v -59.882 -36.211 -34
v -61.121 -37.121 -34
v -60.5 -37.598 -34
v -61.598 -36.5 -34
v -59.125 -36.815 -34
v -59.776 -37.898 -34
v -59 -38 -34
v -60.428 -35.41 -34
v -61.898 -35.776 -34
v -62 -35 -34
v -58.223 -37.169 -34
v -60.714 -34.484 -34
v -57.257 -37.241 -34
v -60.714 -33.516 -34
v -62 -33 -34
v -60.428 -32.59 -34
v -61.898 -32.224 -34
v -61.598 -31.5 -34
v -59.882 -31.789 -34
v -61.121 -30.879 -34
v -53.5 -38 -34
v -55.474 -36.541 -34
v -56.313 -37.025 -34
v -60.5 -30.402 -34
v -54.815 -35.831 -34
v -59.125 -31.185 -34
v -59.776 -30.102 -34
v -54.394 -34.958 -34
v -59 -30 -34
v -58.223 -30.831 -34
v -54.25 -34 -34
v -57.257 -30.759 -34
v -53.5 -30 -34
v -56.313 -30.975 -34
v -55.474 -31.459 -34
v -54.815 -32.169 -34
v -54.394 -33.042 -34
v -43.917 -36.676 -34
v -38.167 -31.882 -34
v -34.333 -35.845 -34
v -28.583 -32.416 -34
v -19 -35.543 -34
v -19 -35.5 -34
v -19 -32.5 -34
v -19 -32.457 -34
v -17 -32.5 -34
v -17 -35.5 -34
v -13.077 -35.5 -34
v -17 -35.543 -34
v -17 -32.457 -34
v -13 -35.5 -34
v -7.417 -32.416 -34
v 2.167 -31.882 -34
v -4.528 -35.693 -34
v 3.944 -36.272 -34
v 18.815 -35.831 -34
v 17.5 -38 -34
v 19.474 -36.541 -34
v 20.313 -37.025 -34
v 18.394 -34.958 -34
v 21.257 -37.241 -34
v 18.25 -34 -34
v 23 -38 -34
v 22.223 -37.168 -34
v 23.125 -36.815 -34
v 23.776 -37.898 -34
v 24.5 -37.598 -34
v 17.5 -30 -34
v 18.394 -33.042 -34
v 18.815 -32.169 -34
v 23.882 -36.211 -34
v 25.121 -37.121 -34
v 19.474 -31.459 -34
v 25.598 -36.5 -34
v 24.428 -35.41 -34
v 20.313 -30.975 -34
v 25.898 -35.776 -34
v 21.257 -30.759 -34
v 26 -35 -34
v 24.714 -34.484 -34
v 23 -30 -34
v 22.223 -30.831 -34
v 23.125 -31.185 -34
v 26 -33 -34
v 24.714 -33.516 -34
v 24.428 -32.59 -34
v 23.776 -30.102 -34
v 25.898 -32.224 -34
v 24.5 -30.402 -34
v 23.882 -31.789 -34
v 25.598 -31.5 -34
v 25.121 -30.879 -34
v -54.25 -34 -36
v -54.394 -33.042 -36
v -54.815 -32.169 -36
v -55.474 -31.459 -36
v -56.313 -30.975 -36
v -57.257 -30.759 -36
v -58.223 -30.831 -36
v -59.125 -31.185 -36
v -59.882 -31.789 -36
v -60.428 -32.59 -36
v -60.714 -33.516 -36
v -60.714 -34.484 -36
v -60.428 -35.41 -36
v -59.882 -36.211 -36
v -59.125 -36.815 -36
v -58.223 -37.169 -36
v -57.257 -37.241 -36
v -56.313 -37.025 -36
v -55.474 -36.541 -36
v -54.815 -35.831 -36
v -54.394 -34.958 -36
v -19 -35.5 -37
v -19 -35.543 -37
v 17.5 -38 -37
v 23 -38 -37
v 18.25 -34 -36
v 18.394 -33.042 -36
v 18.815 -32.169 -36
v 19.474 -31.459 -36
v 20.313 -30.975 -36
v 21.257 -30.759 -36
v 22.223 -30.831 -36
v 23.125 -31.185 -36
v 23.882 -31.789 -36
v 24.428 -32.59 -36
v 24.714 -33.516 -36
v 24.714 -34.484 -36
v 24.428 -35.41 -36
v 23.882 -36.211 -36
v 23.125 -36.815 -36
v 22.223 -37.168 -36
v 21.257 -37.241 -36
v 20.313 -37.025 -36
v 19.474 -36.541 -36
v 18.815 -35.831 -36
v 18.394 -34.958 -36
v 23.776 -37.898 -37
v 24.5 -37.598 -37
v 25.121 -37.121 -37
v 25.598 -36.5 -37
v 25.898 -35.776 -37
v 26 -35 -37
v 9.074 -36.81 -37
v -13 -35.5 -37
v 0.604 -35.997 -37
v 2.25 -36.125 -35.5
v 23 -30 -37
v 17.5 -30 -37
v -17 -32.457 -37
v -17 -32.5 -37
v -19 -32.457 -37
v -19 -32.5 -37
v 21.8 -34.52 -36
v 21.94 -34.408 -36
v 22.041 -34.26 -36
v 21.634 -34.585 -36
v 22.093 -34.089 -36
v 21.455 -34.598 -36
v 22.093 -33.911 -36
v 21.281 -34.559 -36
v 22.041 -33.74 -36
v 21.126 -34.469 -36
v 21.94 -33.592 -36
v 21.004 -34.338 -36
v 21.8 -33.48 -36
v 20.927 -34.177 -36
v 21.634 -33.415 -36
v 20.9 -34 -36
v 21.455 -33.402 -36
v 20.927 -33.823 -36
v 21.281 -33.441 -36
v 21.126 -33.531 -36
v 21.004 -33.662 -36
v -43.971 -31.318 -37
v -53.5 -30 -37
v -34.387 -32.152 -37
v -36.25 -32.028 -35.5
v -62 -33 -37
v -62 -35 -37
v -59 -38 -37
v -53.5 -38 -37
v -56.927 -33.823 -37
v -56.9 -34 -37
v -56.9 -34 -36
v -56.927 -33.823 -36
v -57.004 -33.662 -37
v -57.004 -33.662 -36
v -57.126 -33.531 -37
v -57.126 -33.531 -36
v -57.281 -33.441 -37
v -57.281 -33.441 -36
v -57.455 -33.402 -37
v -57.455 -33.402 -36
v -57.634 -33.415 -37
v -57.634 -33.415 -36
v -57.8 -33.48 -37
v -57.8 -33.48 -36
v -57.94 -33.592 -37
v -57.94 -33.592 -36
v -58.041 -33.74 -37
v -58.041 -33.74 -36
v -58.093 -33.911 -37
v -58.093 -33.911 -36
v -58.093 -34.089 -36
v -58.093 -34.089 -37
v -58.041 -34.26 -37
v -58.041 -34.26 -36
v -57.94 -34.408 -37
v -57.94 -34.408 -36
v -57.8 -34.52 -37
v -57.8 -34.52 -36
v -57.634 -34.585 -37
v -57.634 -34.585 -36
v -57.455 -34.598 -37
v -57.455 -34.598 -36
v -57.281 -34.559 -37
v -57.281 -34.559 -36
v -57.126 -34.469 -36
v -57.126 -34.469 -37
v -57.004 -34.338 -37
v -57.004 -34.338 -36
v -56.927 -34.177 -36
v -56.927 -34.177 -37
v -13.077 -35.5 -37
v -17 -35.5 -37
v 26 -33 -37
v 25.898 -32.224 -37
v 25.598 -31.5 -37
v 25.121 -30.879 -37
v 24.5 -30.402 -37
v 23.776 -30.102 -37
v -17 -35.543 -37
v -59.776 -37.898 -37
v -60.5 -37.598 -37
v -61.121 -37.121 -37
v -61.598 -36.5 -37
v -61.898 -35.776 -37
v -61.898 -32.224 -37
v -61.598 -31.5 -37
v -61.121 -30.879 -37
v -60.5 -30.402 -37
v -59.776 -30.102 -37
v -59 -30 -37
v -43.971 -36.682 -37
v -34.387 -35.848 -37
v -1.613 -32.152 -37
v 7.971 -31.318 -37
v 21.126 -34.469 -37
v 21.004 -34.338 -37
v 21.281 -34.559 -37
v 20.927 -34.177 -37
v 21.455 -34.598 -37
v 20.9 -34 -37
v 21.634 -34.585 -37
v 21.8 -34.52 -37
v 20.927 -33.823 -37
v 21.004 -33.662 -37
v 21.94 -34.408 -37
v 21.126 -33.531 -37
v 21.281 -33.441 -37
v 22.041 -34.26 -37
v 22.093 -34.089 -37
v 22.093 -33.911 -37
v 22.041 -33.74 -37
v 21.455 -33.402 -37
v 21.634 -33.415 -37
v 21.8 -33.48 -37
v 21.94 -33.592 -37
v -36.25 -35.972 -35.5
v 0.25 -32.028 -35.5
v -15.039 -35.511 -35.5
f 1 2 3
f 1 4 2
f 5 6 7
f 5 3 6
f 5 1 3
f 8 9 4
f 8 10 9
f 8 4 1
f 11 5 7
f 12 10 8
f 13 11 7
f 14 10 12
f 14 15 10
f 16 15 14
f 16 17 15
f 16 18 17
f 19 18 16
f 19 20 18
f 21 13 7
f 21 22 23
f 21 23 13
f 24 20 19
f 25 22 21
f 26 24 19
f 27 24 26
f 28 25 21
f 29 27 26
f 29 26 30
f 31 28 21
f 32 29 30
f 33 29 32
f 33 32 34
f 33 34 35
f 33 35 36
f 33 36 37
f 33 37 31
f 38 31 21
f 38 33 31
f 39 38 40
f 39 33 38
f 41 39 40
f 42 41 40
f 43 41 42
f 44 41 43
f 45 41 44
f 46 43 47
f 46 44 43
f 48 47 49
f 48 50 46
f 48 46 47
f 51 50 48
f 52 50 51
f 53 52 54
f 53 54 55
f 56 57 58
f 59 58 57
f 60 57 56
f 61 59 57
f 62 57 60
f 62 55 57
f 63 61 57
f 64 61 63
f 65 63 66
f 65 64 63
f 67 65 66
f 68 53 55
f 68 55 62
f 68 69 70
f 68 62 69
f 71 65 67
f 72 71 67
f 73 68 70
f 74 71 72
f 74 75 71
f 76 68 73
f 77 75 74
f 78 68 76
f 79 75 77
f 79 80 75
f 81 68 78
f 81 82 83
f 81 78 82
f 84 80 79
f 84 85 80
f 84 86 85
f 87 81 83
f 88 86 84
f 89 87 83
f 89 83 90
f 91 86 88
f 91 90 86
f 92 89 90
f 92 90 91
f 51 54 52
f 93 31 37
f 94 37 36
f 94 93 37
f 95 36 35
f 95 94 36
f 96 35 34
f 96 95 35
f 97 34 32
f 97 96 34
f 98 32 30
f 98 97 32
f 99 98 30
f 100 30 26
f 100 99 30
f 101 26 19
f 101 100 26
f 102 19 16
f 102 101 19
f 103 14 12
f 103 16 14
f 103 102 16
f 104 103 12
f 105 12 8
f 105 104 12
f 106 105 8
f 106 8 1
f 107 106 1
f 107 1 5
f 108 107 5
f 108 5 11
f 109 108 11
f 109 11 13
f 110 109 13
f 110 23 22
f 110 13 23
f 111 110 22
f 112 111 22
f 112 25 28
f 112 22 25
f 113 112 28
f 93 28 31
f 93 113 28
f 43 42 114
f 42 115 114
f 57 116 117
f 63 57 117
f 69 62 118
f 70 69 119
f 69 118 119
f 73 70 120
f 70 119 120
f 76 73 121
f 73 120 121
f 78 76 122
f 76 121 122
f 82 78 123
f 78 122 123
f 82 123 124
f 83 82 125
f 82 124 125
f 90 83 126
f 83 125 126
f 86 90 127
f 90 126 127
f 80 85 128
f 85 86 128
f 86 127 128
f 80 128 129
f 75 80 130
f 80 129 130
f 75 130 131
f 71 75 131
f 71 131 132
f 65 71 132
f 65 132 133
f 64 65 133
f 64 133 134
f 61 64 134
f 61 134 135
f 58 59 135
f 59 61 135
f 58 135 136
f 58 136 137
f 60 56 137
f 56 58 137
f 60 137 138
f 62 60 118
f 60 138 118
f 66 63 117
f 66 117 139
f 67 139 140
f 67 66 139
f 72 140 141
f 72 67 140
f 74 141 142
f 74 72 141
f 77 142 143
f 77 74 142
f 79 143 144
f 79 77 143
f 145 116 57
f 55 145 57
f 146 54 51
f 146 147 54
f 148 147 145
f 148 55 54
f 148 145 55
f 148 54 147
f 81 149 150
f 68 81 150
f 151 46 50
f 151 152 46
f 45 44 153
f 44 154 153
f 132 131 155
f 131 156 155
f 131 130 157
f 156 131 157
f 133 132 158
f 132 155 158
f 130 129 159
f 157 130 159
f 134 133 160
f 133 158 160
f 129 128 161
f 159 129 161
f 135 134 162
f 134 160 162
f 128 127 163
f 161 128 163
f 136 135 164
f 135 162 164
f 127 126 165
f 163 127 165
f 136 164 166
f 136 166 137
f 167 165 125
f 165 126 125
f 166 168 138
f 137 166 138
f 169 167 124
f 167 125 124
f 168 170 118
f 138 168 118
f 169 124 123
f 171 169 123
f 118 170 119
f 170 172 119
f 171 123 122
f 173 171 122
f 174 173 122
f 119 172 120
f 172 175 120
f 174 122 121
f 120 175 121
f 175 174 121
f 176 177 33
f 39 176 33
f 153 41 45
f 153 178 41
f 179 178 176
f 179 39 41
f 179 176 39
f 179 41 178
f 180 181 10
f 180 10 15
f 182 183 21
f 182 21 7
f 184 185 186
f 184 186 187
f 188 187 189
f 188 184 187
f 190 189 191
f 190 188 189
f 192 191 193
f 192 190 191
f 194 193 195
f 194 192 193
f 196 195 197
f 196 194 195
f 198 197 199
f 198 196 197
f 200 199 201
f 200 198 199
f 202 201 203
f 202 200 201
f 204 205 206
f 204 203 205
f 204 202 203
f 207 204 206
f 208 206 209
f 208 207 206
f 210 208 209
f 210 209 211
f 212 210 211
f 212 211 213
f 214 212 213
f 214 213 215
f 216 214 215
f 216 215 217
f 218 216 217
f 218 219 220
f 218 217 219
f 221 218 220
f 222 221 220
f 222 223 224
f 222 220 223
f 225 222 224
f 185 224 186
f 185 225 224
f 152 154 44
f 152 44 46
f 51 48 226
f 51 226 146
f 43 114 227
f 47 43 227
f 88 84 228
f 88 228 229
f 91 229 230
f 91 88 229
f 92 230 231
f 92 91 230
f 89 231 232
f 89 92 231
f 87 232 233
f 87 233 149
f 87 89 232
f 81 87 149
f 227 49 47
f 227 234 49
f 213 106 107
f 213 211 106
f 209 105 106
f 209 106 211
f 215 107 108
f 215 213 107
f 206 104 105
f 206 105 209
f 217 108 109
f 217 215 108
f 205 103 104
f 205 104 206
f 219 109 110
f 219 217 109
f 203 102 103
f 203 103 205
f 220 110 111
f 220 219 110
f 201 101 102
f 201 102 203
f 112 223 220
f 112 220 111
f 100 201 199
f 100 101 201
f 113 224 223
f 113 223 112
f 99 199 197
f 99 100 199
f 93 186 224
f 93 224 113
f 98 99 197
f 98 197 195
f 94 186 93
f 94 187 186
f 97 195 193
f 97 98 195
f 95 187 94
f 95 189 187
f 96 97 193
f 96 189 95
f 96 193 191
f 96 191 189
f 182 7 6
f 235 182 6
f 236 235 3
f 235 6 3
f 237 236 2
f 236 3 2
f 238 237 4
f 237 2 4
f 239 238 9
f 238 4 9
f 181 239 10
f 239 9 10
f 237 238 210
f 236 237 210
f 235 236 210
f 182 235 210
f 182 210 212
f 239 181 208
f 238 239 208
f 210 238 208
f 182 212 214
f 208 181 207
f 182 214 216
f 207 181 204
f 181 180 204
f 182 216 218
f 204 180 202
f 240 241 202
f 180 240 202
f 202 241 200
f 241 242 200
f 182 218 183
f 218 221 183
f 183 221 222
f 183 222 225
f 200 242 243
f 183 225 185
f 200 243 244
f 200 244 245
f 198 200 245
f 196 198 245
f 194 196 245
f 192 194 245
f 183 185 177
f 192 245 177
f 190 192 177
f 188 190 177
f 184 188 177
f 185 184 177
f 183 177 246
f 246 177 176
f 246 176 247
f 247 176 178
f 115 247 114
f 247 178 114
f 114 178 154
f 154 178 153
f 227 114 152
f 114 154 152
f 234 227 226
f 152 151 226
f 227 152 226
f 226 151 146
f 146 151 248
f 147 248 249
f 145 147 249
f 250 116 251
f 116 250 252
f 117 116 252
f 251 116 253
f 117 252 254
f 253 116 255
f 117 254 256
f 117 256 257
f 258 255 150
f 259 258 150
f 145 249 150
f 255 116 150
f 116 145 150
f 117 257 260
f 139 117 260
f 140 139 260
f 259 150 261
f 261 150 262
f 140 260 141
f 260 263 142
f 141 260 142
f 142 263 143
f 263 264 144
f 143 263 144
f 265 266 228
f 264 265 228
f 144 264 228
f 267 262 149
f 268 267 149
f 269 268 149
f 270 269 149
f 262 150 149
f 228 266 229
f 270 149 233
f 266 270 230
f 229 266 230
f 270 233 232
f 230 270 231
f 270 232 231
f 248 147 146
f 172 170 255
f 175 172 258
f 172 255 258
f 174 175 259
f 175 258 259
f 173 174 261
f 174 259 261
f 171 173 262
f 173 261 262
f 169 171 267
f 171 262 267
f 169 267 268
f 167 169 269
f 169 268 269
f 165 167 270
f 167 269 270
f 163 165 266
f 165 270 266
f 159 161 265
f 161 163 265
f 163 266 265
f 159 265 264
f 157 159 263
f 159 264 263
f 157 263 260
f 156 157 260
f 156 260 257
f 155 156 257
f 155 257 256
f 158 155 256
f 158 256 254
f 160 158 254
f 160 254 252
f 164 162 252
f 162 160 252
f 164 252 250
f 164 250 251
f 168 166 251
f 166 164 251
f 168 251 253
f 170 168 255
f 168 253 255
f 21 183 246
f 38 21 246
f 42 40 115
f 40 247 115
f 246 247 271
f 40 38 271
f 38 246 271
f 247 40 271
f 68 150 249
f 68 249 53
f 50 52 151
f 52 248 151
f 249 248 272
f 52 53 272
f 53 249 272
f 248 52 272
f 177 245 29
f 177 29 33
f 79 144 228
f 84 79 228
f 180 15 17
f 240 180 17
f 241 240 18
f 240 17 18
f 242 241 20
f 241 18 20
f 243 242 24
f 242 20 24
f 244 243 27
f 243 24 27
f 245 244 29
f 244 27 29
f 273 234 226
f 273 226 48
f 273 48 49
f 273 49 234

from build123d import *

# Parameters (mm, degrees)
BOX081_W                          = 90
BOX081_H                          = 9
BOX081_DEPTH                      = 4
BOX080_W                          = 10
BOX080_H                          = 3
BOX080_DEPTH                      = 4
BOX079_W                          = 40
BOX079_H                          = 10
BOX079_DEPTH                      = 10
CYLINDER143_R                     = 3.25
CYLINDER143_DEPTH                 = 3.5
CYLINDER144_R                     = 0.6
CYLINDER144_DEPTH                 = 9.5
CYLINDER142_R                     = 0.6
CYLINDER142_DEPTH                 = 9.5
CYLINDER141_R                     = 3.25
CYLINDER141_DEPTH                 = 3.5
PAD014_DEPTH                      = 4
FILLET078_R                       = 3
PART_MIRRORING003_PLACEMENT_ANGLE = 180
BOX078_W                          = 40
BOX078_H                          = 10
BOX078_DEPTH                      = 10
CYLINDER137_R                     = 3.25
CYLINDER137_DEPTH                 = 3.5
CYLINDER140_R                     = 0.6
CYLINDER140_DEPTH                 = 9.5
CYLINDER138_R                     = 0.6
CYLINDER138_DEPTH                 = 9.5
CYLINDER139_R                     = 3.25
CYLINDER139_DEPTH                 = 3.5
PAD013_DEPTH                      = 4
FILLET077_R                       = 3


with BuildPart() as w_rfel080:
    # Box081 → Box081 (new body)
    with BuildSketch(Plane(origin=(-63, -38.5, -41), x_dir=(1, 0, 0), z_dir=(0, 0, 1))):
        with Locations((45, 4.5)):
            Rectangle(BOX081_W, BOX081_H)
    extrude(amount=BOX081_DEPTH)


with BuildPart() as w_rfel079:
    # Box080 → Box080 (new body)
    with BuildSketch(Plane(origin=(-23, -35.5, -38), x_dir=(1, 0, 0), z_dir=(0, 0, 1))):
        with Locations((5, 1.5)):
            Rectangle(BOX080_W, BOX080_H)
    extrude(amount=BOX080_DEPTH)


with BuildPart() as w_rfel078:
    # Box079 → Box079 (new body)
    with BuildSketch(Plane(origin=(-14, -72, -42), x_dir=(1, 0, 0), z_dir=(0, 0, 1))):
        with Locations((20, 5)):
            Rectangle(BOX079_W, BOX079_H)
    extrude(amount=BOX079_DEPTH)


with BuildPart() as zylinder143:
    # Cylinder143 → Cylinder143 (new body)
    with BuildSketch(Plane(origin=(-52.5, 23, -36), x_dir=(1, 0, 0), z_dir=(0, 0, 1))):
        Circle(CYLINDER143_R)
    extrude(amount=CYLINDER143_DEPTH)


with BuildPart() as zylinder144:
    # Cylinder144 → Cylinder144 (new body)
    with BuildSketch(Plane(origin=(16.5, 23, -39), x_dir=(1, 0, 0), z_dir=(0, 0, 1))):
        Circle(CYLINDER144_R)
    extrude(amount=CYLINDER144_DEPTH)


with BuildPart() as zylinder142:
    # Cylinder142 → Cylinder142 (new body)
    with BuildSketch(Plane(origin=(-52.5, 23, -39), x_dir=(1, 0, 0), z_dir=(0, 0, 1))):
        Circle(CYLINDER142_R)
    extrude(amount=CYLINDER142_DEPTH)


with BuildPart() as fusion089:
    # Cylinder141 → Cylinder141 (new body)
    with BuildSketch(Plane(origin=(16.5, 23, -36), x_dir=(1, 0, 0), z_dir=(0, 0, 1))):
        Circle(CYLINDER141_R)
    extrude(amount=CYLINDER141_DEPTH)

    # Fusion089: union Zylinder143, Zylinder144, Zylinder142
    add(zylinder143.part)
    add(zylinder144.part)
    add(zylinder142.part)


with BuildPart() as cut068:
    # Sketch014 → Pad014 (new body)
    with BuildSketch(Plane.XY):
        with BuildLine():
            add(Edge.make_bspline(
                [(-48.5, 19), (-18, 24), (12.5, 19)],
                knots=[0, 0, 0, 1, 1, 1], degree=2))
            Line((-48.5, 19), (-57, 19))
            Line((-57, 19), (-57, 27))
            Line((-57, 27), (-48.5, 27))
            add(Edge.make_bspline(
                [(-48.5, 27), (-18, 22), (12.5, 27)],
                knots=[0, 0, 0, 1, 1, 1], degree=2))
            Line((12.5, 27), (21, 27))
            Line((21, 27), (21, 19))
            Line((21, 19), (12.5, 19))
        make_face()
    extrude(amount=PAD014_DEPTH)


with BuildPart() as cut068_1:
    # Body005 placement: moved
    add(cut068.part.moved(Location((0, 0, -38))))

    # Cut069: cut Fusion089
    add(fusion089.part, mode=Mode.SUBTRACT)

    # Fillet078
    fillet078_edges = [cut068_1.edges().sort_by_distance(p)[0] for p in [
        (-57, 19, -36),
        (21, 19, -36),
        (-57, 27, -36),
        (21, 27, -36),
    ]]
    fillet(fillet078_edges, radius=FILLET078_R)


with BuildPart() as cut068_2:
    # Fillet078 placement: moved
    add(cut068_1.part.moved(Location((0, -90, 0))))

    # Cut068: cut Würfel078
    add(w_rfel078.part, mode=Mode.SUBTRACT)


with BuildPart() as cut068_3:
    # Cut068 placement: moved
    add(cut068_2.part.moved(Location((-5, 35, 0))))


with BuildPart() as part_mirroring003:
    # Part__Mirroring003: instance of Cut068
    add(cut068_3.part.mirror(Plane(origin=(-40.5, -8e-06, -36), x_dir=(1, 0, 0), z_dir=(0, 1, 0))))


with BuildPart() as part_mirroring003_1:
    # Part__Mirroring003 placement: moved
    add(part_mirroring003.part.moved(Location((-36, 9, 0))).rotate(Axis((-36, 9, 0), (0, 0, 1)), PART_MIRRORING003_PLACEMENT_ANGLE))


with BuildPart() as w_rfel077:
    # Box078 → Box078 (new body)
    with BuildSketch(Plane(origin=(-14, -72, -42), x_dir=(1, 0, 0), z_dir=(0, 0, 1))):
        with Locations((20, 5)):
            Rectangle(BOX078_W, BOX078_H)
    extrude(amount=BOX078_DEPTH)


with BuildPart() as zylinder137:
    # Cylinder137 → Cylinder137 (new body)
    with BuildSketch(Plane(origin=(-52.5, 23, -36), x_dir=(1, 0, 0), z_dir=(0, 0, 1))):
        Circle(CYLINDER137_R)
    extrude(amount=CYLINDER137_DEPTH)


with BuildPart() as zylinder140:
    # Cylinder140 → Cylinder140 (new body)
    with BuildSketch(Plane(origin=(16.5, 23, -39), x_dir=(1, 0, 0), z_dir=(0, 0, 1))):
        Circle(CYLINDER140_R)
    extrude(amount=CYLINDER140_DEPTH)


with BuildPart() as zylinder138:
    # Cylinder138 → Cylinder138 (new body)
    with BuildSketch(Plane(origin=(-52.5, 23, -39), x_dir=(1, 0, 0), z_dir=(0, 0, 1))):
        Circle(CYLINDER138_R)
    extrude(amount=CYLINDER138_DEPTH)


with BuildPart() as fusion088:
    # Cylinder139 → Cylinder139 (new body)
    with BuildSketch(Plane(origin=(16.5, 23, -36), x_dir=(1, 0, 0), z_dir=(0, 0, 1))):
        Circle(CYLINDER139_R)
    extrude(amount=CYLINDER139_DEPTH)

    # Fusion088: union Zylinder137, Zylinder140, Zylinder138
    add(zylinder137.part)
    add(zylinder140.part)
    add(zylinder138.part)


with BuildPart() as cut070:
    # Sketch013 → Pad013 (new body)
    with BuildSketch(Plane.XY):
        with BuildLine():
            add(Edge.make_bspline(
                [(-48.5, 19), (-18, 24), (12.5, 19)],
                knots=[0, 0, 0, 1, 1, 1], degree=2))
            Line((-48.5, 19), (-57, 19))
            Line((-57, 19), (-57, 27))
            Line((-57, 27), (-48.5, 27))
            add(Edge.make_bspline(
                [(-48.5, 27), (-18, 22), (12.5, 27)],
                knots=[0, 0, 0, 1, 1, 1], degree=2))
            Line((12.5, 27), (21, 27))
            Line((21, 27), (21, 19))
            Line((21, 19), (12.5, 19))
        make_face()
    extrude(amount=PAD013_DEPTH)


with BuildPart() as cut070_1:
    # Body004 placement: moved
    add(cut070.part.moved(Location((0, 0, -38))))

    # Cut066: cut Fusion088
    add(fusion088.part, mode=Mode.SUBTRACT)

    # Fillet077
    fillet077_edges = [cut070_1.edges().sort_by_distance(p)[0] for p in [
        (-57, 19, -36),
        (21, 19, -36),
        (-57, 27, -36),
        (21, 27, -36),
    ]]
    fillet(fillet077_edges, radius=FILLET077_R)


with BuildPart() as cut070_2:
    # Fillet077 placement: moved
    add(cut070_1.part.moved(Location((0, -90, 0))))

    # Cut067: cut Würfel077
    add(w_rfel077.part, mode=Mode.SUBTRACT)


with BuildPart() as cut070_3:
    # Cut067 placement: moved
    add(cut070_2.part.moved(Location((-5, 44, 0))))

    # Fusion090: union Part__Mirroring003
    add(part_mirroring003_1.part)


with BuildPart() as cut070_4:
    # Fusion090 placement: moved
    add(cut070_3.part.moved(Location((0, -11, 0))))

    # Fusion091: union Würfel079
    add(w_rfel079.part)

    # Cut070: cut Würfel080
    add(w_rfel080.part, mode=Mode.SUBTRACT)


solid = cut070_4.part
